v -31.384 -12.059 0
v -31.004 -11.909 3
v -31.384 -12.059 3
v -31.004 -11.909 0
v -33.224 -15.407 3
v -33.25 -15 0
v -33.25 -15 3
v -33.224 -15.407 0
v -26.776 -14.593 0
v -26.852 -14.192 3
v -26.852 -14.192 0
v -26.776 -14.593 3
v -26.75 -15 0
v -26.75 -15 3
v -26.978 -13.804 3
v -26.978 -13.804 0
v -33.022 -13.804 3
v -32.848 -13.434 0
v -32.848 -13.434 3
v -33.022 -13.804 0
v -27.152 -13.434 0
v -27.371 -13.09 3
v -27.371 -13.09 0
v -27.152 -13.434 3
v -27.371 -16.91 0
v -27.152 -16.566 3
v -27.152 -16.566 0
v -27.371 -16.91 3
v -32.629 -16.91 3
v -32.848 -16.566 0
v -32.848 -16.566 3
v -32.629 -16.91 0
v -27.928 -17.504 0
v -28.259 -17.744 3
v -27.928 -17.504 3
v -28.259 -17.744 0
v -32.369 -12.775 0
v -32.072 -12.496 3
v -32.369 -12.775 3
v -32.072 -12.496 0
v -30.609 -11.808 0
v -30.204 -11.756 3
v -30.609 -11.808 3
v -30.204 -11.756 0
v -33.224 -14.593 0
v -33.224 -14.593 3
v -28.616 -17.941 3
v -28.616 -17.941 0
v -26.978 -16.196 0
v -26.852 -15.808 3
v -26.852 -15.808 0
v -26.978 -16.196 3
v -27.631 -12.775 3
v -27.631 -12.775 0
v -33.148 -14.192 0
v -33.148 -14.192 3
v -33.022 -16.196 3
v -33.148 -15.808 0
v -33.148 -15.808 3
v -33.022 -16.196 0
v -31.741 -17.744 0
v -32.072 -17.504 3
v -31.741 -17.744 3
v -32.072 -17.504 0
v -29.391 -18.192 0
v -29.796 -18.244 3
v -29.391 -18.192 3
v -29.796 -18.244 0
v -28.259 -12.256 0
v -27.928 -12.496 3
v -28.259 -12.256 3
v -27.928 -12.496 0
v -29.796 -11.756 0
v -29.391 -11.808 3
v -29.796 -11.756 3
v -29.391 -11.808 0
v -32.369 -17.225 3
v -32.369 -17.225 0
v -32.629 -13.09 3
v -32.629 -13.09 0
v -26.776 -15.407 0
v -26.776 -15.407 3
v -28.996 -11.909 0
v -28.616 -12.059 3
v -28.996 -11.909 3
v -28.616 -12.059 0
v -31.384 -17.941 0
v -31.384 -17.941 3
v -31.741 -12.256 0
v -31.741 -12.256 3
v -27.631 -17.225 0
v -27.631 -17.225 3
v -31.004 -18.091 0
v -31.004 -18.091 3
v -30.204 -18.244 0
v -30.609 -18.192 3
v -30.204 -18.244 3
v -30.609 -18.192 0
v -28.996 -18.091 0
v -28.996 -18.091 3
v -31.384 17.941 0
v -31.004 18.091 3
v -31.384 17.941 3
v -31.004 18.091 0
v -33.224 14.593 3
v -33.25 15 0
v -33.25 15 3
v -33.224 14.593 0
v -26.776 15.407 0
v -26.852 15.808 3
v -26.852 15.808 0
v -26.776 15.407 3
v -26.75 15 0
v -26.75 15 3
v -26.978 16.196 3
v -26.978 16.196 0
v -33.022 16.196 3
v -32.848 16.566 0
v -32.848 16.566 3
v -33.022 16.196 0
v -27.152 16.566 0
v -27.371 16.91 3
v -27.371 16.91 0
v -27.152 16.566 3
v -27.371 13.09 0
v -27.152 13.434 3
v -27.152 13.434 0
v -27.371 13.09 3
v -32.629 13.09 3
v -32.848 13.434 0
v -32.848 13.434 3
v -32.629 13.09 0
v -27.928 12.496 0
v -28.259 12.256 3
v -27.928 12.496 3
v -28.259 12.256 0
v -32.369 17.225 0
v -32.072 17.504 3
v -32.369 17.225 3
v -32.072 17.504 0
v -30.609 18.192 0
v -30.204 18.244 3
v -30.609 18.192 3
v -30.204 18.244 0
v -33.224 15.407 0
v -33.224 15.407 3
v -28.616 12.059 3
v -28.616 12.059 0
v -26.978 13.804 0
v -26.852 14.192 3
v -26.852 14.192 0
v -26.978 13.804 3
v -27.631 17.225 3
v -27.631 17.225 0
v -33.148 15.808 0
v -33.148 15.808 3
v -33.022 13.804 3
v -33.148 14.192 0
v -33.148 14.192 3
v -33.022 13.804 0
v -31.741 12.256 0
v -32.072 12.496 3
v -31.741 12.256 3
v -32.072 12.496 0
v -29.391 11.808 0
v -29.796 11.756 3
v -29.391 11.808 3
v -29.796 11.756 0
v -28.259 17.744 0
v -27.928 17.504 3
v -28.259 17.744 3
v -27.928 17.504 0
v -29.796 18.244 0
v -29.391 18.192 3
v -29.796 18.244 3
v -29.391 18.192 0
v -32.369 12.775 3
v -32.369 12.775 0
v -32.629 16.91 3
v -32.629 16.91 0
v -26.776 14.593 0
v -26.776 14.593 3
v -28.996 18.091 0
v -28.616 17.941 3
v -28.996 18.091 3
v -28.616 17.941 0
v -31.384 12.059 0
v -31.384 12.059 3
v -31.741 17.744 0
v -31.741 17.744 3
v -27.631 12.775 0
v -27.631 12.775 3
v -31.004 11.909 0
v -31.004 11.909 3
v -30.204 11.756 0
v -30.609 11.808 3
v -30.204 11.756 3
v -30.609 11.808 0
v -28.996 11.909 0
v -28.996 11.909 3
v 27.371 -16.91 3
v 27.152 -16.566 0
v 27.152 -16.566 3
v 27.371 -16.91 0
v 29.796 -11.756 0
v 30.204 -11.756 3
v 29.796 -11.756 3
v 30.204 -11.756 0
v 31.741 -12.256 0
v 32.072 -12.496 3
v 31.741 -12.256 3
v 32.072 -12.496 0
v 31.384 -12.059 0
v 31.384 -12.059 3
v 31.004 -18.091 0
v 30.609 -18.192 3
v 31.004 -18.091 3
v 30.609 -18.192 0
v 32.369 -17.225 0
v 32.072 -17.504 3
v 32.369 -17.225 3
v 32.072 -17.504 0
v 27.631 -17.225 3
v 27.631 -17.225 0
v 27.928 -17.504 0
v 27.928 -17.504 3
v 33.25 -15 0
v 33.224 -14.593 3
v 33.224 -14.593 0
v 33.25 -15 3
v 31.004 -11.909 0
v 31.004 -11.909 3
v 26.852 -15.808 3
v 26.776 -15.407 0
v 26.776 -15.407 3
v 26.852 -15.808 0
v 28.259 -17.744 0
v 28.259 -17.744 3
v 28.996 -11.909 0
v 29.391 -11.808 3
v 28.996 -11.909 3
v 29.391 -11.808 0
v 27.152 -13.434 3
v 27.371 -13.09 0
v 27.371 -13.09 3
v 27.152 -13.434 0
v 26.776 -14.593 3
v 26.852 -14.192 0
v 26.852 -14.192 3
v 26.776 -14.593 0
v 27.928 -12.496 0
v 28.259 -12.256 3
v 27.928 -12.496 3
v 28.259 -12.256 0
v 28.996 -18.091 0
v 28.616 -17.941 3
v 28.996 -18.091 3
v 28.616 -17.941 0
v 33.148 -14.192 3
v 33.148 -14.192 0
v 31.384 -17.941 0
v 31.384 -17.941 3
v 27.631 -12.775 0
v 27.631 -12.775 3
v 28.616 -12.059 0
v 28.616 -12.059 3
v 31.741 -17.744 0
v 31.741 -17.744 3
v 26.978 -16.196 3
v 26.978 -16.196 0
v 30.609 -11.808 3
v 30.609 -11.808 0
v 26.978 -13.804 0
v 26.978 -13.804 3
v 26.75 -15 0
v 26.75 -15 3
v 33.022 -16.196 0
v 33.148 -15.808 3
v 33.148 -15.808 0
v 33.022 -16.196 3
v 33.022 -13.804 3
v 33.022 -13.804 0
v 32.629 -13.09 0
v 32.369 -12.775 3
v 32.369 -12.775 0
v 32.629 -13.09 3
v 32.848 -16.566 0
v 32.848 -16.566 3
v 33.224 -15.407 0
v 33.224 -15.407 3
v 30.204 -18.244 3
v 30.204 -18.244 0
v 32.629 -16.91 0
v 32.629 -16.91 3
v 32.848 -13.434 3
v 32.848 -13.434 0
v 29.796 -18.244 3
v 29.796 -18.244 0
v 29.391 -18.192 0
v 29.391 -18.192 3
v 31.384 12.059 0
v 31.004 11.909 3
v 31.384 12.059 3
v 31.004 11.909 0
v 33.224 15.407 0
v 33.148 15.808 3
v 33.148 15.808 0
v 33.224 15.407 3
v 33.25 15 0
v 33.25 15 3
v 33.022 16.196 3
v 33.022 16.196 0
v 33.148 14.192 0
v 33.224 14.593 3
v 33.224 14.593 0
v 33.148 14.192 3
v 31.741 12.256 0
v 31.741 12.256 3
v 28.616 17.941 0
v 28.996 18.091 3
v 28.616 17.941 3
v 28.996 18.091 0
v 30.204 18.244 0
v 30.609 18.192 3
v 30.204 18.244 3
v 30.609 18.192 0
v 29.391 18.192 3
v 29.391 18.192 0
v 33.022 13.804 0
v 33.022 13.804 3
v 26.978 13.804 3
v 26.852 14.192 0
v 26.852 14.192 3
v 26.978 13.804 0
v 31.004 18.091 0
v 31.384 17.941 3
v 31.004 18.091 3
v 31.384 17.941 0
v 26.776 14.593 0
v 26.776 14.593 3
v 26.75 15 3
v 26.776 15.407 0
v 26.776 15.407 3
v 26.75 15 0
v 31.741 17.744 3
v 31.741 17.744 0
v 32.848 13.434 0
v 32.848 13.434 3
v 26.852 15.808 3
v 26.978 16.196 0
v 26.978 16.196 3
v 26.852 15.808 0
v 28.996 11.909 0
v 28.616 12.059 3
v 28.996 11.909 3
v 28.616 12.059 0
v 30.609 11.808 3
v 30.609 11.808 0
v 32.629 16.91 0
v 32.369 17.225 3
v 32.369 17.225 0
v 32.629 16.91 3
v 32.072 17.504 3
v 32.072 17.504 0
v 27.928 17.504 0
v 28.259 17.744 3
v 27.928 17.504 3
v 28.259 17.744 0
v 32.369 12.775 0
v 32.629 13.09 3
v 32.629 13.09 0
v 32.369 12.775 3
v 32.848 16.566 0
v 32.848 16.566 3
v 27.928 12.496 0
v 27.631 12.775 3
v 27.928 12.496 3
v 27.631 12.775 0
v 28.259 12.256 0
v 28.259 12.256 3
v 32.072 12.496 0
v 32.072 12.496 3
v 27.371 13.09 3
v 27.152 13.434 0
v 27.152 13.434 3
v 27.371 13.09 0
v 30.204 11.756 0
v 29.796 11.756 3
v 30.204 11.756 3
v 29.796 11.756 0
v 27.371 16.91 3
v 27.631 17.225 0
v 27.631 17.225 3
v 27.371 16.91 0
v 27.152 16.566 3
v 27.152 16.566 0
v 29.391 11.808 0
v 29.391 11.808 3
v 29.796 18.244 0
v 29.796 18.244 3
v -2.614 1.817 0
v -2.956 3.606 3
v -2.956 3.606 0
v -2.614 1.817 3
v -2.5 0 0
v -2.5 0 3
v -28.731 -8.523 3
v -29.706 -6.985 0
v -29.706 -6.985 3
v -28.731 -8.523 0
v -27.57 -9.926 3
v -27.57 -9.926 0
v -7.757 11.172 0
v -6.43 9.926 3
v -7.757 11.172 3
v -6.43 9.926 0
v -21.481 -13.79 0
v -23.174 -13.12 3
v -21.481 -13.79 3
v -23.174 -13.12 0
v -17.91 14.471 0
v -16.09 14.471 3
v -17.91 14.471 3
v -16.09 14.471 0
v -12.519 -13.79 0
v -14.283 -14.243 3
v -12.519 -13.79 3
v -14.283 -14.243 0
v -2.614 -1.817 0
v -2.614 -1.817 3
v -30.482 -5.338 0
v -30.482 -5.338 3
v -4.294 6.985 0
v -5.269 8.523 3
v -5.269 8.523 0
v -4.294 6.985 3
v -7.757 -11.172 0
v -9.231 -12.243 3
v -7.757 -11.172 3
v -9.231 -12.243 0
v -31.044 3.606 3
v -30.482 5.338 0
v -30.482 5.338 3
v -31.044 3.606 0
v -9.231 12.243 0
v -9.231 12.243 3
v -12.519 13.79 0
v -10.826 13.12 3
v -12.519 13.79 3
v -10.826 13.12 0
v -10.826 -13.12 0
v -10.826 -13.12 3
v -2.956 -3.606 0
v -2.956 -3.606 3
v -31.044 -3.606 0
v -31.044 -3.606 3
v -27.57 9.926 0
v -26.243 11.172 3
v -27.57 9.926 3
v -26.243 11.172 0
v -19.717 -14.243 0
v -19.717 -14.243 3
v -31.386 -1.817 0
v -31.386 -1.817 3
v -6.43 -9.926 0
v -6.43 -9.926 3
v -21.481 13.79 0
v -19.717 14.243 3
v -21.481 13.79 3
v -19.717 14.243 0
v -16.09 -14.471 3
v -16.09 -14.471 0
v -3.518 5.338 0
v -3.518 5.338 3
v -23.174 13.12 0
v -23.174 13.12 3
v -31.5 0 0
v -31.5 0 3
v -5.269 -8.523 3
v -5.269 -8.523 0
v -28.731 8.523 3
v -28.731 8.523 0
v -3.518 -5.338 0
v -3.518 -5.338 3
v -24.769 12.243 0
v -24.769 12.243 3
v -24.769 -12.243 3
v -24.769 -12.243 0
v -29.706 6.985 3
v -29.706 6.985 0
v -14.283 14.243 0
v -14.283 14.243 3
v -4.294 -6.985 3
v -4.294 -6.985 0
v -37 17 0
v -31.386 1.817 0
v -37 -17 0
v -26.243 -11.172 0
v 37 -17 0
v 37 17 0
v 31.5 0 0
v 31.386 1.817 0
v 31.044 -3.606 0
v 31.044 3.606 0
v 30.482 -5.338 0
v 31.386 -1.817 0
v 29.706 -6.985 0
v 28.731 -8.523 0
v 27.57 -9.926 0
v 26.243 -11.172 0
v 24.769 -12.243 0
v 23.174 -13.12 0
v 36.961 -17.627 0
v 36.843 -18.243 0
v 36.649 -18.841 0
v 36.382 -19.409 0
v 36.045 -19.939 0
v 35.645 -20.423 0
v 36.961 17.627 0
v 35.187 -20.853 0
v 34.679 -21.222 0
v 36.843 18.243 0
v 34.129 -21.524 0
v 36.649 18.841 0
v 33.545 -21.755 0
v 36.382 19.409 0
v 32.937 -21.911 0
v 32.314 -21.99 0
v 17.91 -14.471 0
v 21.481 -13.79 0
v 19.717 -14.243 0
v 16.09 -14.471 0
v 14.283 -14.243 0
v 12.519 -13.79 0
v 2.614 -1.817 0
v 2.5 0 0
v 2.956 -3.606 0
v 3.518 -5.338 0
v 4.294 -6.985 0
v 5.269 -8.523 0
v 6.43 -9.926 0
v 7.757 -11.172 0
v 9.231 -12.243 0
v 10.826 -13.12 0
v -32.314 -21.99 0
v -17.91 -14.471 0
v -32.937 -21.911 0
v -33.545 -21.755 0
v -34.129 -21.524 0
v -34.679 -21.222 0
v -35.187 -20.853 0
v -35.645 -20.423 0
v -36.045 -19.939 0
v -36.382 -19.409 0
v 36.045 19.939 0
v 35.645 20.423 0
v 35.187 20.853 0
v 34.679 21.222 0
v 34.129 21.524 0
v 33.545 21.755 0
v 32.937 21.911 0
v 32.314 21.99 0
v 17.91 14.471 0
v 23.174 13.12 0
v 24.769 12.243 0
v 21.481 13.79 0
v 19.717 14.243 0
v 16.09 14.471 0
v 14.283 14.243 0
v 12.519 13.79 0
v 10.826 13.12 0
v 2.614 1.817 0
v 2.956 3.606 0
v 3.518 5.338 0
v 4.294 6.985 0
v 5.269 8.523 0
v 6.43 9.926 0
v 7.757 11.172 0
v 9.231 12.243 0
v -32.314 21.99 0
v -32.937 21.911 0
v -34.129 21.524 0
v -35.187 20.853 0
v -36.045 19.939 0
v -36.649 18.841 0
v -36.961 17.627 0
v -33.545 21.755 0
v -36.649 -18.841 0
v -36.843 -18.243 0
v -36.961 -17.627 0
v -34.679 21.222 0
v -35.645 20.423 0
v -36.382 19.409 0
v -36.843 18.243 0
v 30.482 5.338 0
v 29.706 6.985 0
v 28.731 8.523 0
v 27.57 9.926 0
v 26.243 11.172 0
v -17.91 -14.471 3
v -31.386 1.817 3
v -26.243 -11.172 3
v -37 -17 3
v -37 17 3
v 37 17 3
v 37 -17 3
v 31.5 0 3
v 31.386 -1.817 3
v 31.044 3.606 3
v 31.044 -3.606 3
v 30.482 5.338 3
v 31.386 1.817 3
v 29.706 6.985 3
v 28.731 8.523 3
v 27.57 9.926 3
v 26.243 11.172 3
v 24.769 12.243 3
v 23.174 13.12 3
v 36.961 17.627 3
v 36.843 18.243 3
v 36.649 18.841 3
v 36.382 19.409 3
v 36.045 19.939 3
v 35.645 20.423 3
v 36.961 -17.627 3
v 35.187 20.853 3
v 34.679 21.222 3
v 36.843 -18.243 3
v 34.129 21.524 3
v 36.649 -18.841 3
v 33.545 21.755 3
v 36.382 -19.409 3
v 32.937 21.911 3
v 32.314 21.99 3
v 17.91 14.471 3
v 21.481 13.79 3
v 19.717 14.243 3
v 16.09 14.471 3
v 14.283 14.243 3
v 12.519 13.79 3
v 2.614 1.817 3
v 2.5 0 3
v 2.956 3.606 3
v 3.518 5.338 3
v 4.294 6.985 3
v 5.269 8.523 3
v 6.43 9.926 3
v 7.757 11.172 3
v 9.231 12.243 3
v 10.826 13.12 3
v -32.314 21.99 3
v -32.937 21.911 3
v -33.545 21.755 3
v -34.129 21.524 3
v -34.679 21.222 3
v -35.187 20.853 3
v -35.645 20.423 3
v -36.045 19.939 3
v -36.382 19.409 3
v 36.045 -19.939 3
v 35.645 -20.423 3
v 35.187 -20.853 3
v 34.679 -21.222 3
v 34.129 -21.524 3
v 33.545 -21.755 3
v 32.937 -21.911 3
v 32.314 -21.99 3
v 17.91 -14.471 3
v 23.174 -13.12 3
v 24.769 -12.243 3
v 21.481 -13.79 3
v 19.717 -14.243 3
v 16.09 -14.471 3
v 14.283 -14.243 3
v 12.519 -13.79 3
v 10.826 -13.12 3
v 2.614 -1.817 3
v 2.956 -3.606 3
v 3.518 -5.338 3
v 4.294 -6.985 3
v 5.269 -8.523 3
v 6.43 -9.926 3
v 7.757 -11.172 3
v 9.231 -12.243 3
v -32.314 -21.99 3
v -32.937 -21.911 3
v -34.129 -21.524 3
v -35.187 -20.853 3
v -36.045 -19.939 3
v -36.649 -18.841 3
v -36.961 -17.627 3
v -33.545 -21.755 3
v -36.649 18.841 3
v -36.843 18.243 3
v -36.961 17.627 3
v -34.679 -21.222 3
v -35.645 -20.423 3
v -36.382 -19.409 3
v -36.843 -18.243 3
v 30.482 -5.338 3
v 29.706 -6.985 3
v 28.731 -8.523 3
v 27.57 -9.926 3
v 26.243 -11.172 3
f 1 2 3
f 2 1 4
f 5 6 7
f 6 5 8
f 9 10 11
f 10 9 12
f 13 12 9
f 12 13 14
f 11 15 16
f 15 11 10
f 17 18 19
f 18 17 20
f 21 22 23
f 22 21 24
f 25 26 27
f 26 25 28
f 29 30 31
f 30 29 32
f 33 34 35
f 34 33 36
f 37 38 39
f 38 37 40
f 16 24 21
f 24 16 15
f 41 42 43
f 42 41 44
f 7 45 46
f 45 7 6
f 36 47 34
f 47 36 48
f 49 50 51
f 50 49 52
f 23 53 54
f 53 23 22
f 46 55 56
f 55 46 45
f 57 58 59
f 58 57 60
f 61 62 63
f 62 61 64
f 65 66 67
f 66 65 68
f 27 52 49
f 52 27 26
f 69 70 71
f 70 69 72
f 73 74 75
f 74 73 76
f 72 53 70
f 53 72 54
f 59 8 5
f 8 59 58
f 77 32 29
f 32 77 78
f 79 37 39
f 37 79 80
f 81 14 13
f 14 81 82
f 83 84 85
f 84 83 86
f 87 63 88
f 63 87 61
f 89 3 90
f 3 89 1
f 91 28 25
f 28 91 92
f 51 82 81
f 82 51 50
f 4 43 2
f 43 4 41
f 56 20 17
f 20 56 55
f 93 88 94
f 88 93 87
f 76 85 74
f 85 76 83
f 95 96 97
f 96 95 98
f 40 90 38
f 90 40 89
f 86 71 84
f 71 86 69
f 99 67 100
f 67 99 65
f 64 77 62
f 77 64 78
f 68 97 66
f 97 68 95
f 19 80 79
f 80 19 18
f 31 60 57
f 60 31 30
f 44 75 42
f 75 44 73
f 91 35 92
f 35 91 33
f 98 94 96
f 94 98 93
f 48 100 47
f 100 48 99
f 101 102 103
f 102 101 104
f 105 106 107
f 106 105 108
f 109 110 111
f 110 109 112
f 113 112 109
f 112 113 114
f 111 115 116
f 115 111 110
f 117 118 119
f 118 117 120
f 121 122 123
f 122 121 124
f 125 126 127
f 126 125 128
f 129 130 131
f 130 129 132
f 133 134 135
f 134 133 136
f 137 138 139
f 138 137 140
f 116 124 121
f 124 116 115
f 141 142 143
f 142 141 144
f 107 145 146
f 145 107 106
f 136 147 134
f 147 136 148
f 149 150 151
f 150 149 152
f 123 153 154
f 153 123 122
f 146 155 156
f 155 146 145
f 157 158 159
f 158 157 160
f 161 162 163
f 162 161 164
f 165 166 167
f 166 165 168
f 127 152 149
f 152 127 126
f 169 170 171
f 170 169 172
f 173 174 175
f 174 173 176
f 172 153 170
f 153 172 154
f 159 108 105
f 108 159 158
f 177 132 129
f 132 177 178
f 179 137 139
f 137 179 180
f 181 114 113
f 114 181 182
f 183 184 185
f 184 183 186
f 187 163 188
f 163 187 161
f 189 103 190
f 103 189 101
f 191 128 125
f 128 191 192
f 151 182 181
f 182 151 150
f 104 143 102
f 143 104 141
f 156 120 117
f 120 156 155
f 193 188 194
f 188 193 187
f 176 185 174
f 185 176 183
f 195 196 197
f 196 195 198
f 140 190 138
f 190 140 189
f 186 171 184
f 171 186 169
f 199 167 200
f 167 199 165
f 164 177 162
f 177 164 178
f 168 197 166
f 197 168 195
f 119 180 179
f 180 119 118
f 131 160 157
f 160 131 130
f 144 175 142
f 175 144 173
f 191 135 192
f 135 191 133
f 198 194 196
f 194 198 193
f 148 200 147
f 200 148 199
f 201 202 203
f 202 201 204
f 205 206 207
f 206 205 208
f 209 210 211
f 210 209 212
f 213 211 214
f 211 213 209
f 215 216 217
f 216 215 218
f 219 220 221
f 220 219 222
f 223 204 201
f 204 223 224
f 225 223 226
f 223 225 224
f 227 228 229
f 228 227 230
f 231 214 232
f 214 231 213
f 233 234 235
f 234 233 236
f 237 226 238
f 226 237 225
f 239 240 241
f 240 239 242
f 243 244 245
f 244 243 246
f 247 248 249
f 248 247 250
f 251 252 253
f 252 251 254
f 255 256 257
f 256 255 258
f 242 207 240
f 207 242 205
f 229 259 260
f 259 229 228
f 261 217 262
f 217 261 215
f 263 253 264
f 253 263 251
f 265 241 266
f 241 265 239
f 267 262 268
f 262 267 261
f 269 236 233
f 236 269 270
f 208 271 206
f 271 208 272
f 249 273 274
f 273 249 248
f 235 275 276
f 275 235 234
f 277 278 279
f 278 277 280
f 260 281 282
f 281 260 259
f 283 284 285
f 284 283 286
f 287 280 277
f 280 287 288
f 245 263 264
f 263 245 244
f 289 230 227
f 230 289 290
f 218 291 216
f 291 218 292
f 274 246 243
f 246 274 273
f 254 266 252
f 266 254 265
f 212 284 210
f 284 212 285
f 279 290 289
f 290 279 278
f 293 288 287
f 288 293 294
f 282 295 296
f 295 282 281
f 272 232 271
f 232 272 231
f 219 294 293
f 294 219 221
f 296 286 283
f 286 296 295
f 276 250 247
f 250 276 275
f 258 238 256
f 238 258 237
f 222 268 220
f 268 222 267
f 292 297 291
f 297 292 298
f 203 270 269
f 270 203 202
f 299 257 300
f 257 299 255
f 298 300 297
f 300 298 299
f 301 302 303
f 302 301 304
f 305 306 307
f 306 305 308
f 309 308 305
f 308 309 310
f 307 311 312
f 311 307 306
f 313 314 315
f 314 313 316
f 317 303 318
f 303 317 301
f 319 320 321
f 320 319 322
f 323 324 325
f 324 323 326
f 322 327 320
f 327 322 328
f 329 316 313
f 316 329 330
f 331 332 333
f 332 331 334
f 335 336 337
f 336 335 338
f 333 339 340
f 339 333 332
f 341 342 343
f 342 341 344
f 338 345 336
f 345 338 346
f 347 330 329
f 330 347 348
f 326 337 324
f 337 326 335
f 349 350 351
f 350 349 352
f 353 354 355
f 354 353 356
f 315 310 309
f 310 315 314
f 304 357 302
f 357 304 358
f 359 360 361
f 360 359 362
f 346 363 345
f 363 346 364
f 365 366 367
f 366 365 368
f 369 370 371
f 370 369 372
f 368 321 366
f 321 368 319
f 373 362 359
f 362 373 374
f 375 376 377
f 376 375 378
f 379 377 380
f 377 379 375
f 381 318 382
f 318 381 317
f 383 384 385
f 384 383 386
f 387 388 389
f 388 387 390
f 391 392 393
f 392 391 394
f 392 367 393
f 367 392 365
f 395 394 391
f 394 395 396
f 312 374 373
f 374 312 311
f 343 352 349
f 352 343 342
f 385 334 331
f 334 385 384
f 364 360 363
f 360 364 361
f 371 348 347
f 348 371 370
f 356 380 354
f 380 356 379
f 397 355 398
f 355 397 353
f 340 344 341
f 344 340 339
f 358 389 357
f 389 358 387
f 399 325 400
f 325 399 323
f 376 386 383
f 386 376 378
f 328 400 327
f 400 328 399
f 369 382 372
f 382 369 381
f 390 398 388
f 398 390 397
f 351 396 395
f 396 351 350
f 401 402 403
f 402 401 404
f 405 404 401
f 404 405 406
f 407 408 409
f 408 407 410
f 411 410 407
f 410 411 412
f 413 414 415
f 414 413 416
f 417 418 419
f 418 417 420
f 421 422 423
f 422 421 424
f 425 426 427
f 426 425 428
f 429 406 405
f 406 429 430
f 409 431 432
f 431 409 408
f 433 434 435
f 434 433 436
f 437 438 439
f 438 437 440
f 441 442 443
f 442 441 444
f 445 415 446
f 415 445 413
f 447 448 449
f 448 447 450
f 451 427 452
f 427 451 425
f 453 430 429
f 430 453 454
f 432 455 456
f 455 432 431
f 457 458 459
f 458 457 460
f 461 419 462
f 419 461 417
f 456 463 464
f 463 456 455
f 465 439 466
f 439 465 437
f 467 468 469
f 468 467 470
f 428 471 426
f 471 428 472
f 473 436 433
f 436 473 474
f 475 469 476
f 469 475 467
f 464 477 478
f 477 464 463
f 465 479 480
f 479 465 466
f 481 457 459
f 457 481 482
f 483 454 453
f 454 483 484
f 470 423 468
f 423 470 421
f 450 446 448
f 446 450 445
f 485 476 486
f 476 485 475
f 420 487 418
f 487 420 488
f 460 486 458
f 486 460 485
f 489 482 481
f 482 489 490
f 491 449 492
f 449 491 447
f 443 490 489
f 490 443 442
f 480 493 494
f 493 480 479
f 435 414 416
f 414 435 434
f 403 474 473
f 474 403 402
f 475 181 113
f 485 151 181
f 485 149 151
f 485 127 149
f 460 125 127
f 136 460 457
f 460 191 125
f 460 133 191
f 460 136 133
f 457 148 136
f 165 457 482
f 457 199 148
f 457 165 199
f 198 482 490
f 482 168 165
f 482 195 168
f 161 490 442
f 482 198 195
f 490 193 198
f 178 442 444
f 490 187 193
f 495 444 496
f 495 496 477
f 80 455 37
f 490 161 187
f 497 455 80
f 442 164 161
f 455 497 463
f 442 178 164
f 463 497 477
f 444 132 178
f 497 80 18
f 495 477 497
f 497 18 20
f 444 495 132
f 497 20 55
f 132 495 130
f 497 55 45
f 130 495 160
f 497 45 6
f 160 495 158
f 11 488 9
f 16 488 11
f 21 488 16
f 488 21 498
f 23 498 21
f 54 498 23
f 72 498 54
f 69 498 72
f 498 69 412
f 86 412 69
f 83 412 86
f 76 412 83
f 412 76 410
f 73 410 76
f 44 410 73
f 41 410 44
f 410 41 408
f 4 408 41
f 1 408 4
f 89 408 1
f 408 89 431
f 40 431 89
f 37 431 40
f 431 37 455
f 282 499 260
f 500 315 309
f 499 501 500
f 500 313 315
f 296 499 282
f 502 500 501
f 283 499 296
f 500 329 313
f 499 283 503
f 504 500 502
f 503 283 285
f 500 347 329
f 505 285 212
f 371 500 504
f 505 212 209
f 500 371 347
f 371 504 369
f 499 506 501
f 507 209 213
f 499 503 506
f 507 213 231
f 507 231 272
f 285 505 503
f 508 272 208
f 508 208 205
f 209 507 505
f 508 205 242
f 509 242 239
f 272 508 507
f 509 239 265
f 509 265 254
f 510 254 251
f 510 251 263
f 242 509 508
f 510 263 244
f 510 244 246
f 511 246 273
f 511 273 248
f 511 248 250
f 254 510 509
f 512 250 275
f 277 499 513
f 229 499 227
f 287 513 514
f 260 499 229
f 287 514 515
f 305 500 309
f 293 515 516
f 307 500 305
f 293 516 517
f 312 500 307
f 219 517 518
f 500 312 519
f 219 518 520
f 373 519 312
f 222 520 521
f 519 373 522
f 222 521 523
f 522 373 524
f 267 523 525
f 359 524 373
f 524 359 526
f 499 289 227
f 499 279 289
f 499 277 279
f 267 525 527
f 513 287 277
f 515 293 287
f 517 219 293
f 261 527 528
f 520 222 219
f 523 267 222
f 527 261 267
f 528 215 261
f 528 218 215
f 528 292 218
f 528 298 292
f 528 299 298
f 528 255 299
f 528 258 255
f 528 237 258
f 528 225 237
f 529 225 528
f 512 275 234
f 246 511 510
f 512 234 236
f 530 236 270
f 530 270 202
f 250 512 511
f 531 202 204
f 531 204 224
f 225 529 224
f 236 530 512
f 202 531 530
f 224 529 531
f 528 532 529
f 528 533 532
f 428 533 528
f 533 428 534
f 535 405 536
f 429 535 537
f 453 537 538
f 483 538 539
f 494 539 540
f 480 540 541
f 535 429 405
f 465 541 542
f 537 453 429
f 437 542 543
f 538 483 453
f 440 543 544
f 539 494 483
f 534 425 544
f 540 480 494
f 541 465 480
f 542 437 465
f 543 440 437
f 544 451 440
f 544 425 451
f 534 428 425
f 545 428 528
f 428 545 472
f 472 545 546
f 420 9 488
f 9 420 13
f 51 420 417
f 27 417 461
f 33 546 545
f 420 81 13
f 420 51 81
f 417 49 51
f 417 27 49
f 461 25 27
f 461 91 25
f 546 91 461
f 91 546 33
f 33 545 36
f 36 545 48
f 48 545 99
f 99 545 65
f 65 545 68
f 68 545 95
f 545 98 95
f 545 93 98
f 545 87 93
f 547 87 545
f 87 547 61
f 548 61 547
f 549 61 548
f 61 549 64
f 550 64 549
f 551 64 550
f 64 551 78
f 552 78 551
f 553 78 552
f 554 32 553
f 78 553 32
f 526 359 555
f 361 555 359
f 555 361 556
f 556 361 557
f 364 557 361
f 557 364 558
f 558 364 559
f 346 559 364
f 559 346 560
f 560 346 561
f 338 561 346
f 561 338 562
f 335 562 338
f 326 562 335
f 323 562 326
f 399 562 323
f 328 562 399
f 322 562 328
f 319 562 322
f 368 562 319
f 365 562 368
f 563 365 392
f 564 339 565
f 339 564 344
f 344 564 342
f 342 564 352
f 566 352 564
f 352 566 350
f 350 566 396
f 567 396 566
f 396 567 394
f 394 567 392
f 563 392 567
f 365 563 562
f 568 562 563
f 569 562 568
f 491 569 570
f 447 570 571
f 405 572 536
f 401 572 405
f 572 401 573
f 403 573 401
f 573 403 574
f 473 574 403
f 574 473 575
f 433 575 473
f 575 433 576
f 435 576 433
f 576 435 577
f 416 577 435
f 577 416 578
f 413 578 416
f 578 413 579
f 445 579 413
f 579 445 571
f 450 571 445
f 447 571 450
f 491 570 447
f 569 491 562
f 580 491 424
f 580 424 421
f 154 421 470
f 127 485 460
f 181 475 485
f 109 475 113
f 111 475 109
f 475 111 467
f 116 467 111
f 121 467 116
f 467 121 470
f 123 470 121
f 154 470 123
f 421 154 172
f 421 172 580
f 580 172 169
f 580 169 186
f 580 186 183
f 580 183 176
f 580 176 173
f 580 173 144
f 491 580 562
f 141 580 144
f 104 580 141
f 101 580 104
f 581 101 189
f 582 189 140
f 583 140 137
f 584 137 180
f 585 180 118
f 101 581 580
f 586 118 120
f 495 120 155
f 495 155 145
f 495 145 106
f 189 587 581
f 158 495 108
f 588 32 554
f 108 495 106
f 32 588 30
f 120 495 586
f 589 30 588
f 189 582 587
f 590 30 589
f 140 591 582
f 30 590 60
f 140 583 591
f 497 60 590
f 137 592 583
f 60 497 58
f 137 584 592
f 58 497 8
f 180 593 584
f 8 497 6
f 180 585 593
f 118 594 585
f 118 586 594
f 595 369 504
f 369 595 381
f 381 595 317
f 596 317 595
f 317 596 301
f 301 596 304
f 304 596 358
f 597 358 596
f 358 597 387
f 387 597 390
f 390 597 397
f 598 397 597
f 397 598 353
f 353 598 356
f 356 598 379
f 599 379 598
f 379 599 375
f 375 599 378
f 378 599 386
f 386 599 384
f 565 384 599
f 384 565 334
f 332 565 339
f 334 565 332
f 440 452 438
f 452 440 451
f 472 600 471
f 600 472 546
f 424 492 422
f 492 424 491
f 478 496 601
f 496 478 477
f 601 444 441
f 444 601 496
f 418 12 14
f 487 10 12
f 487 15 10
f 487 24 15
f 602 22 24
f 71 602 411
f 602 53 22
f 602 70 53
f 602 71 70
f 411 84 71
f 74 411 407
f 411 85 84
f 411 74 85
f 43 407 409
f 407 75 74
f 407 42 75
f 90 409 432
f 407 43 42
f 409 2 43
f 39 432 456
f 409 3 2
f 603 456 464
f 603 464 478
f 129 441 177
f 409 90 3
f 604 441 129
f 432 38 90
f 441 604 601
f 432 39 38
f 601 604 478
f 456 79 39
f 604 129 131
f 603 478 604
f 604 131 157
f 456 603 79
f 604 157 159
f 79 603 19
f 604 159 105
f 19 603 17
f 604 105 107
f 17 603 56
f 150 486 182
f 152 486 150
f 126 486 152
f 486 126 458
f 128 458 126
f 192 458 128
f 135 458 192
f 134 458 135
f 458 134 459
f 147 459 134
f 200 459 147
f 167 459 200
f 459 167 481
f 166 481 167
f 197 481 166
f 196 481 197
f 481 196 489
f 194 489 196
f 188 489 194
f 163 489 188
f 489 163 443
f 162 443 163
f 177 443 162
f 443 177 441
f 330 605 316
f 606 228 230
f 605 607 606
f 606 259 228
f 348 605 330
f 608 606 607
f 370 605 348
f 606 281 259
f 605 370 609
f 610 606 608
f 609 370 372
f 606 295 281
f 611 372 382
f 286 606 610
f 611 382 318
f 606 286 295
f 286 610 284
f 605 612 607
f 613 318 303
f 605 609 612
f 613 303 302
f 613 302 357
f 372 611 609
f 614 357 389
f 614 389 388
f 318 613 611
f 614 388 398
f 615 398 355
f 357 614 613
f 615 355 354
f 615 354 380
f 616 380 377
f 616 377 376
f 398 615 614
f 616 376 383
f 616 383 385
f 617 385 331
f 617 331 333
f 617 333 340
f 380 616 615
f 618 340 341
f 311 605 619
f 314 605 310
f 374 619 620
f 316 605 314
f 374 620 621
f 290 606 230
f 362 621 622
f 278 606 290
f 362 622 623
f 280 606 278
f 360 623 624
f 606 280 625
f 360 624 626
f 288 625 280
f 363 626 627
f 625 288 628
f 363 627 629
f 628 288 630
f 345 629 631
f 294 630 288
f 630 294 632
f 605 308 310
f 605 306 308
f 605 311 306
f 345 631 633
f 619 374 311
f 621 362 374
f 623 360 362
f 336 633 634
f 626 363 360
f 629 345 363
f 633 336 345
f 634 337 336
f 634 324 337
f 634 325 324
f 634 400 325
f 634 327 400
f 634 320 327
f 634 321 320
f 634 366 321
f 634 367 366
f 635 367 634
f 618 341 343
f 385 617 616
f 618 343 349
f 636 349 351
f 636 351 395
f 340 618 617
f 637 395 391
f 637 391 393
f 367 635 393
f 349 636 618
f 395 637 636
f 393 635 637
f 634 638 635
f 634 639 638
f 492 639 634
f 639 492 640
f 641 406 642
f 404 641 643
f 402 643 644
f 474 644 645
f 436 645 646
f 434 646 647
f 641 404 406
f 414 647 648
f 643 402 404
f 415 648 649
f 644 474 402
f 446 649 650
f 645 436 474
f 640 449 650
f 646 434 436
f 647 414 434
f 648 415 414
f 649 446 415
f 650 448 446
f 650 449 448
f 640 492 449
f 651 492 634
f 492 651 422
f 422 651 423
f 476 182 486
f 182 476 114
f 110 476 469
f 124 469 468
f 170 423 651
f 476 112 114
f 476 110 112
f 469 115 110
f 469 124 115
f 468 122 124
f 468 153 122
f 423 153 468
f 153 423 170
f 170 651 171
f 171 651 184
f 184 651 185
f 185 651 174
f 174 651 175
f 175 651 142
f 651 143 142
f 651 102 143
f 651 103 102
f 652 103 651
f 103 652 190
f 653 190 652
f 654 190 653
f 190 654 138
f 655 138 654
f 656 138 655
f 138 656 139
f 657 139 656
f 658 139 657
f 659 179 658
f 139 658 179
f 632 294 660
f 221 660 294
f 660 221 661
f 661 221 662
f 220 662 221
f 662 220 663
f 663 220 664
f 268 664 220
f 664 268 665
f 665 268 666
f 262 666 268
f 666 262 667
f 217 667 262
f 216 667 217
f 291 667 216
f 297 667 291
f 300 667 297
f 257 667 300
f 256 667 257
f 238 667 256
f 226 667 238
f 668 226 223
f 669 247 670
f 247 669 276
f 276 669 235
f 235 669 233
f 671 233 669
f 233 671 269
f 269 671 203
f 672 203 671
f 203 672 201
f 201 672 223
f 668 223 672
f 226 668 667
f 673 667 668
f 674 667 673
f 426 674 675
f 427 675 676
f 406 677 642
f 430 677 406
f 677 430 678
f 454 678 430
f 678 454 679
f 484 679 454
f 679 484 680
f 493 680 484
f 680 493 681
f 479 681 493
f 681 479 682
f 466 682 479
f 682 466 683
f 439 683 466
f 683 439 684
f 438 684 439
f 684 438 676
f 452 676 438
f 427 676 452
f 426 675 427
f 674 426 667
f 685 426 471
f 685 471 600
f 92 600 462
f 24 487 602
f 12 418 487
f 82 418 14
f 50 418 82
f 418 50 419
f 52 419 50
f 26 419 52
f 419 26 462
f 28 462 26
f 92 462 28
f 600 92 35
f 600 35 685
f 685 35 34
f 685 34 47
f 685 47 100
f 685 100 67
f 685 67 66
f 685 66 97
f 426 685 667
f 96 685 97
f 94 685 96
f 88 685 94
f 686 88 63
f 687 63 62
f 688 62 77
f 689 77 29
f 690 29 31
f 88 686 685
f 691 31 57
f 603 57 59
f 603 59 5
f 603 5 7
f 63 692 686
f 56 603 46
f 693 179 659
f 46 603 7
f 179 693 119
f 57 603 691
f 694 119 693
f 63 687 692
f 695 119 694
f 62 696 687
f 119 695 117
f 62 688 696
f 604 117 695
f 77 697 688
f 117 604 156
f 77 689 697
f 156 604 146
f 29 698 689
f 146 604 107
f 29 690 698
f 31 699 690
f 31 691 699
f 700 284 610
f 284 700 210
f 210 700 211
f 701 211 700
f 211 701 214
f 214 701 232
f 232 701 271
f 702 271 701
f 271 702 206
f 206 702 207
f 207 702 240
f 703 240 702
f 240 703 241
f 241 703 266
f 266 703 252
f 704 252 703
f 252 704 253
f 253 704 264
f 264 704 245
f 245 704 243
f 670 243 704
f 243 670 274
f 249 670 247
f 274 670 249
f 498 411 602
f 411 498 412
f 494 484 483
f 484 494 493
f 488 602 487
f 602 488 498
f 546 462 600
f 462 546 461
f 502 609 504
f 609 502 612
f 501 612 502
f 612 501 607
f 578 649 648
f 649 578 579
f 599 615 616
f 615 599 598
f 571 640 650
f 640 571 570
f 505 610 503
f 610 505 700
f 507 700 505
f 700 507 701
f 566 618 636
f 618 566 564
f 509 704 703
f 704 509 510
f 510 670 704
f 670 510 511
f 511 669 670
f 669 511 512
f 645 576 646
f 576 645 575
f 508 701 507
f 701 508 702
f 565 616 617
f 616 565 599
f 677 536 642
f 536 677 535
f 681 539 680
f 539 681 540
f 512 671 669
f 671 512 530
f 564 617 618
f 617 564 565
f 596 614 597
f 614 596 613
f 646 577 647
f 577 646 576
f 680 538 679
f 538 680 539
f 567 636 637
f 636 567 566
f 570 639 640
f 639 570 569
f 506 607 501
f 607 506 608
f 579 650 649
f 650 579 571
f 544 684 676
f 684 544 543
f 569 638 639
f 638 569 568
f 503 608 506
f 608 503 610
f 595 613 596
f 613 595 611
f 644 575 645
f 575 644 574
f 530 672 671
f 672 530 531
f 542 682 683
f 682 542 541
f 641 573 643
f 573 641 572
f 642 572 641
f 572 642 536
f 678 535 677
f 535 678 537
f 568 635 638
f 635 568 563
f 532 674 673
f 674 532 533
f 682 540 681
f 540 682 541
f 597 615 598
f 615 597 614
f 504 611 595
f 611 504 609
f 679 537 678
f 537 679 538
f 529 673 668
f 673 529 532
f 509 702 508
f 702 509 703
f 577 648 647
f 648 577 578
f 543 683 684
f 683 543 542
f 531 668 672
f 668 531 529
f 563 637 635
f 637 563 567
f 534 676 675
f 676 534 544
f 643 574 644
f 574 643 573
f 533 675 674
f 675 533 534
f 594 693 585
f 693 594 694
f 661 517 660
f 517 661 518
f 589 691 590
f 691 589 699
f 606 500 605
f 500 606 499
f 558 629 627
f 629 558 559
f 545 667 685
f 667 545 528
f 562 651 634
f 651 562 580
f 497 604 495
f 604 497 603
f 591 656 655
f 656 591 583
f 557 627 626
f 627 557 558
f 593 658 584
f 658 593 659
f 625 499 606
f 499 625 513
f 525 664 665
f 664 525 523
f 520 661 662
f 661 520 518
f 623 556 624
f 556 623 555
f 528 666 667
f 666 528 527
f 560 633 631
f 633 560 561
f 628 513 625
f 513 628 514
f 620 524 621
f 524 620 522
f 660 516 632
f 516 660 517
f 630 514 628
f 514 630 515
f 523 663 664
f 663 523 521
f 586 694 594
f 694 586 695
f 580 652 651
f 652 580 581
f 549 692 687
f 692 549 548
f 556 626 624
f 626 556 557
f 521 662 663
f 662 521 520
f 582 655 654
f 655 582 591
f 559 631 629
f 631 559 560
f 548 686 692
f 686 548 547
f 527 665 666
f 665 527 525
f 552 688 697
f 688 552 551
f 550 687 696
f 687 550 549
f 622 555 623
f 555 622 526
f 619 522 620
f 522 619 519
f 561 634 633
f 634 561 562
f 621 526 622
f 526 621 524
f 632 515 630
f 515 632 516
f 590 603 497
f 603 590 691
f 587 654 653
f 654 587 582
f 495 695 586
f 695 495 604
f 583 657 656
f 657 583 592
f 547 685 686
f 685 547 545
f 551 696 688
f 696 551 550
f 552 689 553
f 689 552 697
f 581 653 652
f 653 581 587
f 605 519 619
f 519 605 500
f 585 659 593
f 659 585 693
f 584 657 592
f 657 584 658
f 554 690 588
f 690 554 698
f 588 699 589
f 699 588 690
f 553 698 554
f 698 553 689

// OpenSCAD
$fn = 50;


difference() {
	union() {
		hull() {
			translate(v = [-32.0000000000, 17.0000000000, 0]) {
				cylinder(h = 3, r = 5);
			}
			translate(v = [32.0000000000, 17.0000000000, 0]) {
				cylinder(h = 3, r = 5);
			}
			translate(v = [-32.0000000000, -17.0000000000, 0]) {
				cylinder(h = 3, r = 5);
			}
			translate(v = [32.0000000000, -17.0000000000, 0]) {
				cylinder(h = 3, r = 5);
			}
		}
	}
	union() {
		#translate(v = [-30.0000000000, -15.0000000000, -100.0000000000]) {
			cylinder(h = 200, r = 3.2500000000);
		}
		#translate(v = [-30.0000000000, 15.0000000000, -100.0000000000]) {
			cylinder(h = 200, r = 3.2500000000);
		}
		#translate(v = [30.0000000000, -15.0000000000, -100.0000000000]) {
			cylinder(h = 200, r = 3.2500000000);
		}
		#translate(v = [30.0000000000, 15.0000000000, -100.0000000000]) {
			cylinder(h = 200, r = 3.2500000000);
		}
		#translate(v = [-17.0000000000, 0, 0]) {
			cylinder(h = 3, r = 14.5000000000);
		}
		#translate(v = [17.0000000000, 0, 0]) {
			cylinder(h = 3, r = 14.5000000000);
		}
	}
}
